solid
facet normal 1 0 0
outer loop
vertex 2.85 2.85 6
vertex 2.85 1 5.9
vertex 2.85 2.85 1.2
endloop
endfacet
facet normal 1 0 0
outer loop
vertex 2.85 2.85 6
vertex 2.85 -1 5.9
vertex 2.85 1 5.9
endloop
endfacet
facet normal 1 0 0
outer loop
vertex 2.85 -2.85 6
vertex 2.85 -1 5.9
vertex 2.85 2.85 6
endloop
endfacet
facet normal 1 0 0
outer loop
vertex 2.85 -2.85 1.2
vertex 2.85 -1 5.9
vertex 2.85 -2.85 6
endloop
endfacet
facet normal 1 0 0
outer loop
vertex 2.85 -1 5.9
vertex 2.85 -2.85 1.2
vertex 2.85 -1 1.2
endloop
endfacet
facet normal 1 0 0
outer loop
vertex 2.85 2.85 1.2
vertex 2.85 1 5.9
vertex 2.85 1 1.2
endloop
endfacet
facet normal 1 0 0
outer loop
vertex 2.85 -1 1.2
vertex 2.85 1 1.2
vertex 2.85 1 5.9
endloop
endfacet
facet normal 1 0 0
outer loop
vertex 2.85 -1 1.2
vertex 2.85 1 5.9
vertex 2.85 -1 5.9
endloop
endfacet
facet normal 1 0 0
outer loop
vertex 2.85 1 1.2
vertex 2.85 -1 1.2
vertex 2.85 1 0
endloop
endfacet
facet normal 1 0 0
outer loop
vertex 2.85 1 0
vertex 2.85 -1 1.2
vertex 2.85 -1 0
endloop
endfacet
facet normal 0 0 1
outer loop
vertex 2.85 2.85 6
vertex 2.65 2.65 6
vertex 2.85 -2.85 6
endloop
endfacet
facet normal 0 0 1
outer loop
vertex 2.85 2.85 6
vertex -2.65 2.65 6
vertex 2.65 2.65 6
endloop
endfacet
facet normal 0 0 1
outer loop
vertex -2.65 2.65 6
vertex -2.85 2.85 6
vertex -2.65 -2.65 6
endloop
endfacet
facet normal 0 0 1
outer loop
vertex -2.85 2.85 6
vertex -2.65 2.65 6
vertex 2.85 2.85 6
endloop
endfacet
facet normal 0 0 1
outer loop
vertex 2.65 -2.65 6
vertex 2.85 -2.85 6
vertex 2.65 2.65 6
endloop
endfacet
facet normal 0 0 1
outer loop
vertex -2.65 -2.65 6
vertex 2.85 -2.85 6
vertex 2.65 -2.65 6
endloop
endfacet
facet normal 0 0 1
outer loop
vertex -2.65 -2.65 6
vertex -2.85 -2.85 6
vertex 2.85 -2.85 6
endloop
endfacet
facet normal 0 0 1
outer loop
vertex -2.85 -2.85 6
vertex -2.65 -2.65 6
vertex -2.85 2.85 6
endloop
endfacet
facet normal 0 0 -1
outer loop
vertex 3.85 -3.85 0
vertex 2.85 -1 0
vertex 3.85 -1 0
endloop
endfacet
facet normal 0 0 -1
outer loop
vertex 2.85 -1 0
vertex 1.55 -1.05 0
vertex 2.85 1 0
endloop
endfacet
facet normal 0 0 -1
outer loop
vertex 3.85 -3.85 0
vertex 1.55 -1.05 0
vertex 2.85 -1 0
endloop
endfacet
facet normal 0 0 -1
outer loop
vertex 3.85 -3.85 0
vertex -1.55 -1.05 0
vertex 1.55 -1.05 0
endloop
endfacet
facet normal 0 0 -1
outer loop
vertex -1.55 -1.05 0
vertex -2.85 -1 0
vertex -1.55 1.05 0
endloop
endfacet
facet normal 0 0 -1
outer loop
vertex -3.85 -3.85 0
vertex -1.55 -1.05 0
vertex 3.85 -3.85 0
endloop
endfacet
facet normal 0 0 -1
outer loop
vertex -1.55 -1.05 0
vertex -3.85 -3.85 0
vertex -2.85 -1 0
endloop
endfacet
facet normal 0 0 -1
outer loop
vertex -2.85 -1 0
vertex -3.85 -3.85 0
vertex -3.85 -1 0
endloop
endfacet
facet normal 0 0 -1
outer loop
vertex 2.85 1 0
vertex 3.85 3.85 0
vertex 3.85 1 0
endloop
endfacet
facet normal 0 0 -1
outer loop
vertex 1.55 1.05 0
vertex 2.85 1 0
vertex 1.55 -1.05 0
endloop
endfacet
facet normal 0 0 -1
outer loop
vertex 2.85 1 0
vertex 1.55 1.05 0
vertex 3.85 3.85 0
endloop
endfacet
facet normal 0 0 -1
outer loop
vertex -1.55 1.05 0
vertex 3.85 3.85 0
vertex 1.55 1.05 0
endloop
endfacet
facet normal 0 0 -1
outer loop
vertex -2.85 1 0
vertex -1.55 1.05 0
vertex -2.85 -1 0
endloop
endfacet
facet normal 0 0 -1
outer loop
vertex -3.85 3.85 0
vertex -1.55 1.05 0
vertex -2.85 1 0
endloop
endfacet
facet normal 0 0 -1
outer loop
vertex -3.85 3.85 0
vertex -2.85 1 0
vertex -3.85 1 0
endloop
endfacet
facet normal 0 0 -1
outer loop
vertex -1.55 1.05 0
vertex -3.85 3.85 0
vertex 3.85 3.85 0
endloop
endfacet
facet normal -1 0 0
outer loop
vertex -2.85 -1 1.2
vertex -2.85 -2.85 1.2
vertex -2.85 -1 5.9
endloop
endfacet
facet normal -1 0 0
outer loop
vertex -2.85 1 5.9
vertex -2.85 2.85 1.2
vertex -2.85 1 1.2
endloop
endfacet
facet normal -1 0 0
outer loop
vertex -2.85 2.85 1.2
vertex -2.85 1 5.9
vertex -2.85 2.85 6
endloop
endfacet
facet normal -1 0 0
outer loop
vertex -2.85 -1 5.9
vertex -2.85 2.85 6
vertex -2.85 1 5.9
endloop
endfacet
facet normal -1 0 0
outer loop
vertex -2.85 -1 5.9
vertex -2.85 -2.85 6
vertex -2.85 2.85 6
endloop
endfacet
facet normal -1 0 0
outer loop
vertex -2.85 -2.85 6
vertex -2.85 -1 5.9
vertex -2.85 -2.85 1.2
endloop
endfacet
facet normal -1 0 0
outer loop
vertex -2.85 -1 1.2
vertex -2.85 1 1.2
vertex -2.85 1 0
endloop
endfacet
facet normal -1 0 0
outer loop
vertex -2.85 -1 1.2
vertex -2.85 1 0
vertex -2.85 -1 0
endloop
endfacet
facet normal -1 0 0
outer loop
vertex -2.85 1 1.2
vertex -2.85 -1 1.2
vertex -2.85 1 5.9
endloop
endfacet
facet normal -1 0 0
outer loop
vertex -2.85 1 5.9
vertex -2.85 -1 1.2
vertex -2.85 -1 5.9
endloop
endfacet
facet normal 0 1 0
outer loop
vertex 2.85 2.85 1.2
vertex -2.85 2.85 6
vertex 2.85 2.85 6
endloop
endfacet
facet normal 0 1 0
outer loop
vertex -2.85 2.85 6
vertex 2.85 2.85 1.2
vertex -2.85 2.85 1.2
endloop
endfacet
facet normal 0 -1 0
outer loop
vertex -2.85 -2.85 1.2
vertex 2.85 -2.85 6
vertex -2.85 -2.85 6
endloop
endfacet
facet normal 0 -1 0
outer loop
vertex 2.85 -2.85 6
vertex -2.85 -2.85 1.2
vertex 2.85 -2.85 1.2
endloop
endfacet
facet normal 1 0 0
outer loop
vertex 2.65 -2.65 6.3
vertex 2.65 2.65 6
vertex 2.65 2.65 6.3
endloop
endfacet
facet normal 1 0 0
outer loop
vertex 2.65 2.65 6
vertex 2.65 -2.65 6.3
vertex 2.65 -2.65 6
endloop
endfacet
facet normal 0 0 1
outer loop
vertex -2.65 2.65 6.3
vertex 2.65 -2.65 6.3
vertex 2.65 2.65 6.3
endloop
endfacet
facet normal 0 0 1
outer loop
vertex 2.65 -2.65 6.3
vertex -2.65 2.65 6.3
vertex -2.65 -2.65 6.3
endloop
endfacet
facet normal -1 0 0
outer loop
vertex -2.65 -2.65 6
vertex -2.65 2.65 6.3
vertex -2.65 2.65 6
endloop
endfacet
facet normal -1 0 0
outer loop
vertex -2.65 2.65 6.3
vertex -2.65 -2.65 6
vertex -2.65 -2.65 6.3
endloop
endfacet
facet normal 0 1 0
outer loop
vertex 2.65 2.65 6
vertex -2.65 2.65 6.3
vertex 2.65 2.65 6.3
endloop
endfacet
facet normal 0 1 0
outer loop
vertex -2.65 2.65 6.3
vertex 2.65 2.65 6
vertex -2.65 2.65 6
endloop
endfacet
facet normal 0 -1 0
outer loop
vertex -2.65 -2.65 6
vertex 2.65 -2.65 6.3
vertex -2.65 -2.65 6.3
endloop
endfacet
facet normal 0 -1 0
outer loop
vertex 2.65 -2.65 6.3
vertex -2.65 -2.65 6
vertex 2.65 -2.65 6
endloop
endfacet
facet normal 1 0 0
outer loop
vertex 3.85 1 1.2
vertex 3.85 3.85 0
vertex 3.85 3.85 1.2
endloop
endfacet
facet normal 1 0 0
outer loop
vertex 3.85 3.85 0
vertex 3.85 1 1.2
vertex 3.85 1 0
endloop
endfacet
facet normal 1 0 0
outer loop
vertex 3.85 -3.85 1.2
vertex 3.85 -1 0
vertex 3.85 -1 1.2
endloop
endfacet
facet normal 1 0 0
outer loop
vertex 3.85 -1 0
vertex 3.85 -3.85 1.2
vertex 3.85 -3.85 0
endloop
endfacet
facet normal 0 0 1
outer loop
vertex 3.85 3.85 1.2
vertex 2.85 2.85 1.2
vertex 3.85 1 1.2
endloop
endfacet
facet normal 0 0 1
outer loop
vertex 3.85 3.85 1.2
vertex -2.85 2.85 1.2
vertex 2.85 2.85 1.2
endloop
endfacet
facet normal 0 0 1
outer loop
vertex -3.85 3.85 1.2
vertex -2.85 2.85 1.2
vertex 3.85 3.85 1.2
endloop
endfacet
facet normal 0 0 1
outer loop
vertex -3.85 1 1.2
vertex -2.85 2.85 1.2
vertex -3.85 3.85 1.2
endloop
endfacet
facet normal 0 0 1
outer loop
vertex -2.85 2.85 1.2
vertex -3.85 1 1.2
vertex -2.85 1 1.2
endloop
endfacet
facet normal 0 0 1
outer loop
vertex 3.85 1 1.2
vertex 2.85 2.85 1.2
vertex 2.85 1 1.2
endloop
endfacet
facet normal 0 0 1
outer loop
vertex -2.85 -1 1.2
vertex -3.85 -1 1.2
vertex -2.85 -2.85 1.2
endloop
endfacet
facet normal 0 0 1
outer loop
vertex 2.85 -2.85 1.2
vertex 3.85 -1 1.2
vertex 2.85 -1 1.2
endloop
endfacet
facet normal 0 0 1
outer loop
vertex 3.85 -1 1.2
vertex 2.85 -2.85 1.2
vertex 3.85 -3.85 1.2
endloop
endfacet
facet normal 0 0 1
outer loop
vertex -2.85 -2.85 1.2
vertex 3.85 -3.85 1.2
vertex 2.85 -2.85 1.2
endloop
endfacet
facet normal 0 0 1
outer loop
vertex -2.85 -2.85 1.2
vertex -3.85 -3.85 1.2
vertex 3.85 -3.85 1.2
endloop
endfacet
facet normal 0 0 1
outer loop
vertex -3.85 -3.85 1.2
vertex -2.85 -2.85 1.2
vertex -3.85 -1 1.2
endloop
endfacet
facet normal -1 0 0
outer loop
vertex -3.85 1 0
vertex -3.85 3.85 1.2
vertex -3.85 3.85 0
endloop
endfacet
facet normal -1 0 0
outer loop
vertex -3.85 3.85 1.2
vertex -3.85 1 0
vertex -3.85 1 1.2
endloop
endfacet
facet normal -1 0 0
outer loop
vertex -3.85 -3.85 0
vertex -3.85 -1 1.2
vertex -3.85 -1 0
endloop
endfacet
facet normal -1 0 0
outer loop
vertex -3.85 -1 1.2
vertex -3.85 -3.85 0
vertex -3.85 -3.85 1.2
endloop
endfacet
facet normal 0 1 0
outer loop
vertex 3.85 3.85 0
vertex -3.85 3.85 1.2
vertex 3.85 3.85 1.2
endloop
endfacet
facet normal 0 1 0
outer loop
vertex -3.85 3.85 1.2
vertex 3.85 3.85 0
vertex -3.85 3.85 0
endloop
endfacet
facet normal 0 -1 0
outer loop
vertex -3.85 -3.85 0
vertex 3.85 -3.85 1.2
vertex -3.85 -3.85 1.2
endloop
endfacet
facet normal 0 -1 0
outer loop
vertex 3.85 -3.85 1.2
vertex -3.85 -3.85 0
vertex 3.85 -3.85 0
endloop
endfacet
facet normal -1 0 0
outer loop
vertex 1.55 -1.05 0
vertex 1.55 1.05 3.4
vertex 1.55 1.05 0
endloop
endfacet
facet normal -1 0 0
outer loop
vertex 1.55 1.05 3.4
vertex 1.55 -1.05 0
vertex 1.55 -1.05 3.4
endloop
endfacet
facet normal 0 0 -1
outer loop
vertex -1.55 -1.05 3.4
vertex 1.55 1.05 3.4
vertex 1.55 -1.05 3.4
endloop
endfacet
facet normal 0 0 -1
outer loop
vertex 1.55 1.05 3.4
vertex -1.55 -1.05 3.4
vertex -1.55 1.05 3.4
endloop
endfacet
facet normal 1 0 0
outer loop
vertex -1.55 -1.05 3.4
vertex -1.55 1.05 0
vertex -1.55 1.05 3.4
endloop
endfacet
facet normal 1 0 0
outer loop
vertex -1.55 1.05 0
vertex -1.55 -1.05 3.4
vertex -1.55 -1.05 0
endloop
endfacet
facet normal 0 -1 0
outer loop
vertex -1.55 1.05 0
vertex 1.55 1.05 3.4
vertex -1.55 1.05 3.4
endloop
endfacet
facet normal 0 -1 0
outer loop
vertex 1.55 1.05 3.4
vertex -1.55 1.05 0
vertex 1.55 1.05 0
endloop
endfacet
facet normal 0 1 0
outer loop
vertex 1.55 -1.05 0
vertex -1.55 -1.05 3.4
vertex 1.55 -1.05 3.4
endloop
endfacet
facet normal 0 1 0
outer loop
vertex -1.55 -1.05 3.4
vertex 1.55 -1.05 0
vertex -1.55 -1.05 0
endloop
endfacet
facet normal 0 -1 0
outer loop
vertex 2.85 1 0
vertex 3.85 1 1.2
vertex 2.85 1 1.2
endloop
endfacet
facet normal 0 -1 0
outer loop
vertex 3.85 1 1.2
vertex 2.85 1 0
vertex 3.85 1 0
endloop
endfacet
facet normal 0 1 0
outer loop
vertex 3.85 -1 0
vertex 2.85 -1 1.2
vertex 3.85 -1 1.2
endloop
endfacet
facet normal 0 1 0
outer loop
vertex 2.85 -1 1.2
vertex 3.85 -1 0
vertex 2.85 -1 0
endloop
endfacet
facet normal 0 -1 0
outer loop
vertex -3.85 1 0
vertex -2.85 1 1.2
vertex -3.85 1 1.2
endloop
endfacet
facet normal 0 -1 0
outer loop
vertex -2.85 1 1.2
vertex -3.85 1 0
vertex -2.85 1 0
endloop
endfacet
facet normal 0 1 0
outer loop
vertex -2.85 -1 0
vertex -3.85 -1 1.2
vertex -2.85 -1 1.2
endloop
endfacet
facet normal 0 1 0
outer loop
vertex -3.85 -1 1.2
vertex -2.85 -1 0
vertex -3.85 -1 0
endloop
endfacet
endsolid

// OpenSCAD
//OpenSCAD-Skript

//Moduldefinition mit Parametern
module rahmen (
//Parameter
rim=2,hght=6,leno=5.7,ctl=3.1,ctw=2.1
)
//Beginn Modul
{
difference(){   //difference 1
union(){        //union 1
difference(){   //difference 2
union(){        //union 2
    //alles, was vor der nächsten geschweiften Klammer steht, wird zusammengefügt (union 2)

//Rahmenkörper
translate([-leno/2,-leno/2,0]) cube([leno,leno,hght]);
translate([-leno/2+0.2,-leno/2+0.2,hght]) cube([leno-0.4,leno-0.4,0.3]);
//Rand
translate([-leno/2-rim/2,-leno/2-rim/2,0]) cube([leno+rim,leno+rim,1.2]);
}               //union 2 end
    //alles, was vor der nächsten geschweiften Klammer steht, wird davon abgezogen (difference 2)
//Ausschnitt
translate([-ctl/2,-ctw/2,-0.1]) cube([ctl,ctw,3.5]);
//Führung
translate([leno/2,-1,-0.1]) cube([2,2,hght]);
rotate([0,0,180]) translate([leno/2,-1,-0.1]) cube([2,2,hght]);
}  //difference 2 end
    //alles, was vor der nächsten geschweiften Klammer steht, wird dazu hinzugefügt (union 1)


}               //union 1 end
    //alles, was vor der nächsten geschweiften Klammer steht, wird davon wieder abgezogen (difference 1)

}               //difference 1 end

}  //module end


//Hier werden Instanzen des Moduls aufgerufen
translate([0,0,0]) rahmen();
